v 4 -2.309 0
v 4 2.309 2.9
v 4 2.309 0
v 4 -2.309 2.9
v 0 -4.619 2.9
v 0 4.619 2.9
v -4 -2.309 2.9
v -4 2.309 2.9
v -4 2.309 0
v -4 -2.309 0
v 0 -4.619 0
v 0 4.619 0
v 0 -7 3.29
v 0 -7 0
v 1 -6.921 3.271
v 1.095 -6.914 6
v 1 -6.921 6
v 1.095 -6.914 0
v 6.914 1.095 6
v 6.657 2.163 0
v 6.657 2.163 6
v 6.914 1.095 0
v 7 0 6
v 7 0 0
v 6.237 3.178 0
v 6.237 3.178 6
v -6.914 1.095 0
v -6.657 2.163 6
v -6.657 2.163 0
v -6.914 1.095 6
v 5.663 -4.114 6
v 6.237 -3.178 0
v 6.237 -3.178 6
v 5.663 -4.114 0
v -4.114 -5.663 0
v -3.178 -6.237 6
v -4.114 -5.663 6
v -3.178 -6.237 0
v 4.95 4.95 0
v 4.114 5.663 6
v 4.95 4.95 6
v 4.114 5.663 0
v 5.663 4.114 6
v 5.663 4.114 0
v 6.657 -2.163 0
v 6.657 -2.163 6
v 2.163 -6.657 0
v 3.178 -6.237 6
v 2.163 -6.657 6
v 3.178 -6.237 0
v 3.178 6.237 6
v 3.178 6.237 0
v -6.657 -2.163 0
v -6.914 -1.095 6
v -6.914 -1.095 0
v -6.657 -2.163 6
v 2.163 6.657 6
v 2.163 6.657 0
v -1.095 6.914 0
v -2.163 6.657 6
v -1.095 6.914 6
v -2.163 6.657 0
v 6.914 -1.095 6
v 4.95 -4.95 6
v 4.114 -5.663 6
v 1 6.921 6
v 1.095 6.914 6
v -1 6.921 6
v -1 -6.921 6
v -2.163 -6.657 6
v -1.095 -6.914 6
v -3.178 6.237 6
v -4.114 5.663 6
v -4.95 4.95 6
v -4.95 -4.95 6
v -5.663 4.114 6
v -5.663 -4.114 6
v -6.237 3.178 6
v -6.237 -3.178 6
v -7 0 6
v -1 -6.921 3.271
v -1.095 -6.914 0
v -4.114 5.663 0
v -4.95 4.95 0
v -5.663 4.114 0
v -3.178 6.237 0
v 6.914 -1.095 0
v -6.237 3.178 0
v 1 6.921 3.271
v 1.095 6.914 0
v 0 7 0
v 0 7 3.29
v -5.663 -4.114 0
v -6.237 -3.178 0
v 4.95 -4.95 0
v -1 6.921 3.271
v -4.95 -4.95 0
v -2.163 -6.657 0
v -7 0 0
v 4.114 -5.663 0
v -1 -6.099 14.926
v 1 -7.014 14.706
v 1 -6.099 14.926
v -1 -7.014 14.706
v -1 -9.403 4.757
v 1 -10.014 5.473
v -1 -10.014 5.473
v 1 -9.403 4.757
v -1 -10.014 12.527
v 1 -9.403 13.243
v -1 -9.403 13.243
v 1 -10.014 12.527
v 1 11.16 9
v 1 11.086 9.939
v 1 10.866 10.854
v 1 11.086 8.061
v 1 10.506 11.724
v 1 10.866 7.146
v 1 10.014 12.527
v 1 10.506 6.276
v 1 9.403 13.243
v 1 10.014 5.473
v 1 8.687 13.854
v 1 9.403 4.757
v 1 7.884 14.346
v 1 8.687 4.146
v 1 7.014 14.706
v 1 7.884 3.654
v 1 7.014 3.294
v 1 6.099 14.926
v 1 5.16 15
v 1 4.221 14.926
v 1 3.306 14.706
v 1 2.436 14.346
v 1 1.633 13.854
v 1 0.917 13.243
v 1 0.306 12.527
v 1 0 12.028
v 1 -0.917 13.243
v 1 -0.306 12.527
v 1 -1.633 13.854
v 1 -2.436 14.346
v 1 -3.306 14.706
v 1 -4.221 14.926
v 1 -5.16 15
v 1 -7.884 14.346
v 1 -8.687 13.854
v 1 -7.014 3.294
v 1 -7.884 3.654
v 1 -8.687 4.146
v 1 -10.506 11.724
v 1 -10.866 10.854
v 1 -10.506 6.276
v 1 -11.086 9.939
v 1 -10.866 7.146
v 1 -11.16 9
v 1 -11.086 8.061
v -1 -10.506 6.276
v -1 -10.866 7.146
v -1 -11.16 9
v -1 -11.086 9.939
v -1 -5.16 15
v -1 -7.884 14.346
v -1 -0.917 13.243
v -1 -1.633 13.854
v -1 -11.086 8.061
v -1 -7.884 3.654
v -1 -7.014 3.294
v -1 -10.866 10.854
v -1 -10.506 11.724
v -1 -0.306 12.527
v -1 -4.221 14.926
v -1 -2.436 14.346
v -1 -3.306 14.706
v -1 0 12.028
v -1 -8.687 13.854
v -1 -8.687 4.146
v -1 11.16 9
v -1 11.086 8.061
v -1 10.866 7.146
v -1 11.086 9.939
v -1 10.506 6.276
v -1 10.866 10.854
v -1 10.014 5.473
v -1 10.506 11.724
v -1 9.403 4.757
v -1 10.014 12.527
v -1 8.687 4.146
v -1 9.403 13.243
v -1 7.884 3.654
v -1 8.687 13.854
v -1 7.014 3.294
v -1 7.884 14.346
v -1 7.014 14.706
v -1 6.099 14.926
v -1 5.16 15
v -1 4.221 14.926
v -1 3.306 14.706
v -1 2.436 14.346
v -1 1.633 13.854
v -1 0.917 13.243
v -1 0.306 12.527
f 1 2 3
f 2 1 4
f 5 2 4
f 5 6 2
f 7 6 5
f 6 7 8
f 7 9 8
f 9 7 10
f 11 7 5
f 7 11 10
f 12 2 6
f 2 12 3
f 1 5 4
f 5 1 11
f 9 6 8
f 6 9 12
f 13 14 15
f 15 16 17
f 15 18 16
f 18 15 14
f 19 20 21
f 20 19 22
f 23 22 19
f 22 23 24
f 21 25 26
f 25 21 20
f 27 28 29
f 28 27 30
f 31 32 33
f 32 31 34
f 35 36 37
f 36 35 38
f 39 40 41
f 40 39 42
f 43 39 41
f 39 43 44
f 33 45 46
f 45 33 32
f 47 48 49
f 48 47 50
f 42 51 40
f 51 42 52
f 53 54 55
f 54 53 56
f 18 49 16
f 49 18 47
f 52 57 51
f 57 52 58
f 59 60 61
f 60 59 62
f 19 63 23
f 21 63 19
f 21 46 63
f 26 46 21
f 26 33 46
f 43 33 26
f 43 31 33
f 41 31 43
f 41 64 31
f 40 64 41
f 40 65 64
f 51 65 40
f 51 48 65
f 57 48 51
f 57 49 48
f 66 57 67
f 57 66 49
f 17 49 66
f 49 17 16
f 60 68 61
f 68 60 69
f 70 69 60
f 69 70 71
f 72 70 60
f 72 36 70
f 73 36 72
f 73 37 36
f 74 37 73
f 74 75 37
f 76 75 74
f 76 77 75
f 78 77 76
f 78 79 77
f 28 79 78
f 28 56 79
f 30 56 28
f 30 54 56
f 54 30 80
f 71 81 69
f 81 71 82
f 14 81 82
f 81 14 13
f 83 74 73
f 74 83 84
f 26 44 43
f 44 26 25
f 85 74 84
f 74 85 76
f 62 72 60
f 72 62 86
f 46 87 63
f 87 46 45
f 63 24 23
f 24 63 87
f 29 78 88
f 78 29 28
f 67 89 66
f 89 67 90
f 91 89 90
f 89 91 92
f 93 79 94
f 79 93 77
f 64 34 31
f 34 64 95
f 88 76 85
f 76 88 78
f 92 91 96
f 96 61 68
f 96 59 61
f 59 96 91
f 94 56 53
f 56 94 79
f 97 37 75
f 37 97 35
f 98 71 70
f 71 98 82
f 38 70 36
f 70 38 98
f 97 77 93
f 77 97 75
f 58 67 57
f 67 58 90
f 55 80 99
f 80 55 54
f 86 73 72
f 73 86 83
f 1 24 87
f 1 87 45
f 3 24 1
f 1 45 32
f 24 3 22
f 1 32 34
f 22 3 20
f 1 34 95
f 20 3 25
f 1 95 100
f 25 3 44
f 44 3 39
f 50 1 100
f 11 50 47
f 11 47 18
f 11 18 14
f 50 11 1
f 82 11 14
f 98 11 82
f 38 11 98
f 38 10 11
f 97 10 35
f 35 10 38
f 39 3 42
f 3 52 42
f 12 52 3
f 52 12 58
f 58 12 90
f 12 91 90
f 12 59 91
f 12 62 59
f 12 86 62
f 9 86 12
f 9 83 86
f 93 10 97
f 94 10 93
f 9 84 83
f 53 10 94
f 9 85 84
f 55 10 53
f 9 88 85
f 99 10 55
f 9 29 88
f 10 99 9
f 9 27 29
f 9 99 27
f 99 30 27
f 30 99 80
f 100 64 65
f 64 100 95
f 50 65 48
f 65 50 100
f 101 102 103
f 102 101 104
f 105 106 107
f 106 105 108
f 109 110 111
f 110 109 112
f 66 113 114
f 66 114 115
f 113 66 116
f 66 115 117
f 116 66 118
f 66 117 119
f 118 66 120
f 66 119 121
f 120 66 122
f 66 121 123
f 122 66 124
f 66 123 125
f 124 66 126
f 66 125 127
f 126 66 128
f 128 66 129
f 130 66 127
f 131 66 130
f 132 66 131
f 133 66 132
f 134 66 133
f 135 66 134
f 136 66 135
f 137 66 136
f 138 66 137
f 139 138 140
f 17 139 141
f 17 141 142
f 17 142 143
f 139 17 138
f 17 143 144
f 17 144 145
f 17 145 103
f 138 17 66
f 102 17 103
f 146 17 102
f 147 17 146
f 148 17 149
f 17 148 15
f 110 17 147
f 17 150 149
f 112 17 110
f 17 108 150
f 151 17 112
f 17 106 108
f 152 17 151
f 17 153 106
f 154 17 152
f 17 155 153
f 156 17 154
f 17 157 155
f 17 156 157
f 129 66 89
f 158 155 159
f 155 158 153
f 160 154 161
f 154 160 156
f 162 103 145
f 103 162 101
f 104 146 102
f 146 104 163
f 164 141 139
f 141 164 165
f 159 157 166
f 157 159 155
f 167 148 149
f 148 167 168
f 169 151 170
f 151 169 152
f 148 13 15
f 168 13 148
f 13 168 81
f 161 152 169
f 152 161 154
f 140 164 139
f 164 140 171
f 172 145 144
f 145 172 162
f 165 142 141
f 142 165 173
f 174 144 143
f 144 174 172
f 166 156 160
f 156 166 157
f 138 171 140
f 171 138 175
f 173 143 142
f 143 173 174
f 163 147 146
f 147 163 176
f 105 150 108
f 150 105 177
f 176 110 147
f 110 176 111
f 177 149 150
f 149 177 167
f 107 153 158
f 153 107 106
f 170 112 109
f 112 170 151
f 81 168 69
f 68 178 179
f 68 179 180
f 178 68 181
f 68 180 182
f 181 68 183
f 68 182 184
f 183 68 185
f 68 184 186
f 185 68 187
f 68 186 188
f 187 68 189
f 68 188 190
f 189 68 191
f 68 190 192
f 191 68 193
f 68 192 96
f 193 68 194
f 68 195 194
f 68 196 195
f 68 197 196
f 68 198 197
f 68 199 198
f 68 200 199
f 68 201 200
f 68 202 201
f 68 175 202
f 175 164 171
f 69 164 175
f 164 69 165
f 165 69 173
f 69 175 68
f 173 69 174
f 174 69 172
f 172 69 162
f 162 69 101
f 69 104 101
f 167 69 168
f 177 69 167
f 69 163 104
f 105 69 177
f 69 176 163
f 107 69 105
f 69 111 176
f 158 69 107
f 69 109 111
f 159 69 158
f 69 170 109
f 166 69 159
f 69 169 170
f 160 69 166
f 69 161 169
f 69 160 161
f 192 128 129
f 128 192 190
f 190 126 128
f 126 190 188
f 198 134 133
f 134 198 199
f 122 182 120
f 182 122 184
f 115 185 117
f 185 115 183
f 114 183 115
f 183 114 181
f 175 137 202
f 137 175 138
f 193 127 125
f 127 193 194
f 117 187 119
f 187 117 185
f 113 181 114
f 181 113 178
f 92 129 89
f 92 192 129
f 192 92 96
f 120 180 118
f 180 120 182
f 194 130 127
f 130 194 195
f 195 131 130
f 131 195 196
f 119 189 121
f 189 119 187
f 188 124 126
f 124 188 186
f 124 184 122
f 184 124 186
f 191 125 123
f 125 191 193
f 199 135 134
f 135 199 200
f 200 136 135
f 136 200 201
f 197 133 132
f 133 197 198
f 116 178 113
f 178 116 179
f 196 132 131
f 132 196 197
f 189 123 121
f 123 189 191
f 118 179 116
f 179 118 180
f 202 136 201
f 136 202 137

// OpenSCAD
/*
Finger-Friendly Snap-On Hex Socket (a.k.a. Bolt Ears)
Copyright (C) 2015 Marcio Teixeira

This program is free software; you can redistribute it and/or
modify it under the terms of the GNU General Public License
as published by the Free Software Foundation; either version 2
of the License, or (at your option) any later version.

This program is distributed in the hope that it will be useful,
but WITHOUT ANY WARRANTY; without even the implied warranty of
MERCHANTABILITY or FITNESS FOR A PARTICULAR PURPOSE.  See the
GNU General Public License for more details.

You should have received a copy of the GNU General Public License
along with this program; if not, write to the Free Software
Foundation, Inc., 51 Franklin Street, Fifth Floor, Boston, MA  02110-1301, USA.
*/

/* Combination hex socket and finger friendly Mickey ears, great
 * for easy removal of access panels (I used to curse my central AC
 * whenever it came time to change the filter. Not anymore!)
 */

/* [Hex Socket] */

// Measurement from flat face to opposite face on the bolt head, make it snug so it stays on firmly
head_dimension  = 8;

// Just a bit deeper than the depth of the bolt head
socket_depth    = 3.0;

/* [Customize] */
wall_thickness = 3.0;
ear_diameter   = head_dimension*1.5;
ear_thickness  = 2.0;
ear_spacing    = 0.43;     // [0:0.05:0.75]
ear_style      = "mickey"; // [mickey, pill, retro]

/* [Hidden] */

$fn=40;

module hull_or_not(hull) {
    if(hull == true) {
        hull() children();
    } else {
        children();
    }
}

module symmetry(axis) {
    mirror(axis) {
        children();
    }
    children();
}

/* Constructs a hexagon */
module hexagon(d, h,sides=6) {
    w  = (d/2)*tan(360/(sides*2))*2;
    translate([0,0,h/2])
        for( a = [0:360/sides:360] ) {
            rotate([0,0,a])
                cube([d,w,h],center=true);
        }
}

/* Constructs a hex socket */
module hex_socket(d, h, wall_thickness, sides=6) {
    difference() {
        cylinder(d=d+wall_thickness*2,h=h+wall_thickness);
        translate([0,0,-0.1])
            hexagon(d,h);
    }
}

/* Combination hex socket and finger friendly Mickey ears */
module finger_wrench() {
    hex_socket(head_dimension, socket_depth, wall_thickness);

    cylinder_width = head_dimension+wall_thickness*2;
    
    // Give it ears
    if(ear_style == "retro") {
        // Fancy tapered style
        hull() {
            symmetry([0,1,0])
            translate([0,ear_diameter*(ear_spacing+1)/2, socket_depth + ear_diameter*3/4])
                rotate([0,90,0])
                    hull() {
                        cylinder(r=ear_diameter/4, center=true, h=ear_thickness);
                        translate([ear_diameter/4,0,0])
                            cylinder(r=ear_diameter/4, center=true, h=ear_thickness);
                    }
            
            translate([0,0, socket_depth + wall_thickness/2])
                cube(size=[ear_thickness*1.5,cylinder_width,ear_thickness], center=true);
        }
    } else {
        // Pill and mickey styles differ only by whether they are hulled
        hull_or_not(ear_style != "mickey")
        symmetry([0,1,0])
        translate([0,ear_diameter*ear_spacing,ear_diameter/2+socket_depth])
        rotate([0,90,0])
            cylinder(d=ear_diameter,h=ear_thickness, center=true);
    }
}

finger_wrench();
